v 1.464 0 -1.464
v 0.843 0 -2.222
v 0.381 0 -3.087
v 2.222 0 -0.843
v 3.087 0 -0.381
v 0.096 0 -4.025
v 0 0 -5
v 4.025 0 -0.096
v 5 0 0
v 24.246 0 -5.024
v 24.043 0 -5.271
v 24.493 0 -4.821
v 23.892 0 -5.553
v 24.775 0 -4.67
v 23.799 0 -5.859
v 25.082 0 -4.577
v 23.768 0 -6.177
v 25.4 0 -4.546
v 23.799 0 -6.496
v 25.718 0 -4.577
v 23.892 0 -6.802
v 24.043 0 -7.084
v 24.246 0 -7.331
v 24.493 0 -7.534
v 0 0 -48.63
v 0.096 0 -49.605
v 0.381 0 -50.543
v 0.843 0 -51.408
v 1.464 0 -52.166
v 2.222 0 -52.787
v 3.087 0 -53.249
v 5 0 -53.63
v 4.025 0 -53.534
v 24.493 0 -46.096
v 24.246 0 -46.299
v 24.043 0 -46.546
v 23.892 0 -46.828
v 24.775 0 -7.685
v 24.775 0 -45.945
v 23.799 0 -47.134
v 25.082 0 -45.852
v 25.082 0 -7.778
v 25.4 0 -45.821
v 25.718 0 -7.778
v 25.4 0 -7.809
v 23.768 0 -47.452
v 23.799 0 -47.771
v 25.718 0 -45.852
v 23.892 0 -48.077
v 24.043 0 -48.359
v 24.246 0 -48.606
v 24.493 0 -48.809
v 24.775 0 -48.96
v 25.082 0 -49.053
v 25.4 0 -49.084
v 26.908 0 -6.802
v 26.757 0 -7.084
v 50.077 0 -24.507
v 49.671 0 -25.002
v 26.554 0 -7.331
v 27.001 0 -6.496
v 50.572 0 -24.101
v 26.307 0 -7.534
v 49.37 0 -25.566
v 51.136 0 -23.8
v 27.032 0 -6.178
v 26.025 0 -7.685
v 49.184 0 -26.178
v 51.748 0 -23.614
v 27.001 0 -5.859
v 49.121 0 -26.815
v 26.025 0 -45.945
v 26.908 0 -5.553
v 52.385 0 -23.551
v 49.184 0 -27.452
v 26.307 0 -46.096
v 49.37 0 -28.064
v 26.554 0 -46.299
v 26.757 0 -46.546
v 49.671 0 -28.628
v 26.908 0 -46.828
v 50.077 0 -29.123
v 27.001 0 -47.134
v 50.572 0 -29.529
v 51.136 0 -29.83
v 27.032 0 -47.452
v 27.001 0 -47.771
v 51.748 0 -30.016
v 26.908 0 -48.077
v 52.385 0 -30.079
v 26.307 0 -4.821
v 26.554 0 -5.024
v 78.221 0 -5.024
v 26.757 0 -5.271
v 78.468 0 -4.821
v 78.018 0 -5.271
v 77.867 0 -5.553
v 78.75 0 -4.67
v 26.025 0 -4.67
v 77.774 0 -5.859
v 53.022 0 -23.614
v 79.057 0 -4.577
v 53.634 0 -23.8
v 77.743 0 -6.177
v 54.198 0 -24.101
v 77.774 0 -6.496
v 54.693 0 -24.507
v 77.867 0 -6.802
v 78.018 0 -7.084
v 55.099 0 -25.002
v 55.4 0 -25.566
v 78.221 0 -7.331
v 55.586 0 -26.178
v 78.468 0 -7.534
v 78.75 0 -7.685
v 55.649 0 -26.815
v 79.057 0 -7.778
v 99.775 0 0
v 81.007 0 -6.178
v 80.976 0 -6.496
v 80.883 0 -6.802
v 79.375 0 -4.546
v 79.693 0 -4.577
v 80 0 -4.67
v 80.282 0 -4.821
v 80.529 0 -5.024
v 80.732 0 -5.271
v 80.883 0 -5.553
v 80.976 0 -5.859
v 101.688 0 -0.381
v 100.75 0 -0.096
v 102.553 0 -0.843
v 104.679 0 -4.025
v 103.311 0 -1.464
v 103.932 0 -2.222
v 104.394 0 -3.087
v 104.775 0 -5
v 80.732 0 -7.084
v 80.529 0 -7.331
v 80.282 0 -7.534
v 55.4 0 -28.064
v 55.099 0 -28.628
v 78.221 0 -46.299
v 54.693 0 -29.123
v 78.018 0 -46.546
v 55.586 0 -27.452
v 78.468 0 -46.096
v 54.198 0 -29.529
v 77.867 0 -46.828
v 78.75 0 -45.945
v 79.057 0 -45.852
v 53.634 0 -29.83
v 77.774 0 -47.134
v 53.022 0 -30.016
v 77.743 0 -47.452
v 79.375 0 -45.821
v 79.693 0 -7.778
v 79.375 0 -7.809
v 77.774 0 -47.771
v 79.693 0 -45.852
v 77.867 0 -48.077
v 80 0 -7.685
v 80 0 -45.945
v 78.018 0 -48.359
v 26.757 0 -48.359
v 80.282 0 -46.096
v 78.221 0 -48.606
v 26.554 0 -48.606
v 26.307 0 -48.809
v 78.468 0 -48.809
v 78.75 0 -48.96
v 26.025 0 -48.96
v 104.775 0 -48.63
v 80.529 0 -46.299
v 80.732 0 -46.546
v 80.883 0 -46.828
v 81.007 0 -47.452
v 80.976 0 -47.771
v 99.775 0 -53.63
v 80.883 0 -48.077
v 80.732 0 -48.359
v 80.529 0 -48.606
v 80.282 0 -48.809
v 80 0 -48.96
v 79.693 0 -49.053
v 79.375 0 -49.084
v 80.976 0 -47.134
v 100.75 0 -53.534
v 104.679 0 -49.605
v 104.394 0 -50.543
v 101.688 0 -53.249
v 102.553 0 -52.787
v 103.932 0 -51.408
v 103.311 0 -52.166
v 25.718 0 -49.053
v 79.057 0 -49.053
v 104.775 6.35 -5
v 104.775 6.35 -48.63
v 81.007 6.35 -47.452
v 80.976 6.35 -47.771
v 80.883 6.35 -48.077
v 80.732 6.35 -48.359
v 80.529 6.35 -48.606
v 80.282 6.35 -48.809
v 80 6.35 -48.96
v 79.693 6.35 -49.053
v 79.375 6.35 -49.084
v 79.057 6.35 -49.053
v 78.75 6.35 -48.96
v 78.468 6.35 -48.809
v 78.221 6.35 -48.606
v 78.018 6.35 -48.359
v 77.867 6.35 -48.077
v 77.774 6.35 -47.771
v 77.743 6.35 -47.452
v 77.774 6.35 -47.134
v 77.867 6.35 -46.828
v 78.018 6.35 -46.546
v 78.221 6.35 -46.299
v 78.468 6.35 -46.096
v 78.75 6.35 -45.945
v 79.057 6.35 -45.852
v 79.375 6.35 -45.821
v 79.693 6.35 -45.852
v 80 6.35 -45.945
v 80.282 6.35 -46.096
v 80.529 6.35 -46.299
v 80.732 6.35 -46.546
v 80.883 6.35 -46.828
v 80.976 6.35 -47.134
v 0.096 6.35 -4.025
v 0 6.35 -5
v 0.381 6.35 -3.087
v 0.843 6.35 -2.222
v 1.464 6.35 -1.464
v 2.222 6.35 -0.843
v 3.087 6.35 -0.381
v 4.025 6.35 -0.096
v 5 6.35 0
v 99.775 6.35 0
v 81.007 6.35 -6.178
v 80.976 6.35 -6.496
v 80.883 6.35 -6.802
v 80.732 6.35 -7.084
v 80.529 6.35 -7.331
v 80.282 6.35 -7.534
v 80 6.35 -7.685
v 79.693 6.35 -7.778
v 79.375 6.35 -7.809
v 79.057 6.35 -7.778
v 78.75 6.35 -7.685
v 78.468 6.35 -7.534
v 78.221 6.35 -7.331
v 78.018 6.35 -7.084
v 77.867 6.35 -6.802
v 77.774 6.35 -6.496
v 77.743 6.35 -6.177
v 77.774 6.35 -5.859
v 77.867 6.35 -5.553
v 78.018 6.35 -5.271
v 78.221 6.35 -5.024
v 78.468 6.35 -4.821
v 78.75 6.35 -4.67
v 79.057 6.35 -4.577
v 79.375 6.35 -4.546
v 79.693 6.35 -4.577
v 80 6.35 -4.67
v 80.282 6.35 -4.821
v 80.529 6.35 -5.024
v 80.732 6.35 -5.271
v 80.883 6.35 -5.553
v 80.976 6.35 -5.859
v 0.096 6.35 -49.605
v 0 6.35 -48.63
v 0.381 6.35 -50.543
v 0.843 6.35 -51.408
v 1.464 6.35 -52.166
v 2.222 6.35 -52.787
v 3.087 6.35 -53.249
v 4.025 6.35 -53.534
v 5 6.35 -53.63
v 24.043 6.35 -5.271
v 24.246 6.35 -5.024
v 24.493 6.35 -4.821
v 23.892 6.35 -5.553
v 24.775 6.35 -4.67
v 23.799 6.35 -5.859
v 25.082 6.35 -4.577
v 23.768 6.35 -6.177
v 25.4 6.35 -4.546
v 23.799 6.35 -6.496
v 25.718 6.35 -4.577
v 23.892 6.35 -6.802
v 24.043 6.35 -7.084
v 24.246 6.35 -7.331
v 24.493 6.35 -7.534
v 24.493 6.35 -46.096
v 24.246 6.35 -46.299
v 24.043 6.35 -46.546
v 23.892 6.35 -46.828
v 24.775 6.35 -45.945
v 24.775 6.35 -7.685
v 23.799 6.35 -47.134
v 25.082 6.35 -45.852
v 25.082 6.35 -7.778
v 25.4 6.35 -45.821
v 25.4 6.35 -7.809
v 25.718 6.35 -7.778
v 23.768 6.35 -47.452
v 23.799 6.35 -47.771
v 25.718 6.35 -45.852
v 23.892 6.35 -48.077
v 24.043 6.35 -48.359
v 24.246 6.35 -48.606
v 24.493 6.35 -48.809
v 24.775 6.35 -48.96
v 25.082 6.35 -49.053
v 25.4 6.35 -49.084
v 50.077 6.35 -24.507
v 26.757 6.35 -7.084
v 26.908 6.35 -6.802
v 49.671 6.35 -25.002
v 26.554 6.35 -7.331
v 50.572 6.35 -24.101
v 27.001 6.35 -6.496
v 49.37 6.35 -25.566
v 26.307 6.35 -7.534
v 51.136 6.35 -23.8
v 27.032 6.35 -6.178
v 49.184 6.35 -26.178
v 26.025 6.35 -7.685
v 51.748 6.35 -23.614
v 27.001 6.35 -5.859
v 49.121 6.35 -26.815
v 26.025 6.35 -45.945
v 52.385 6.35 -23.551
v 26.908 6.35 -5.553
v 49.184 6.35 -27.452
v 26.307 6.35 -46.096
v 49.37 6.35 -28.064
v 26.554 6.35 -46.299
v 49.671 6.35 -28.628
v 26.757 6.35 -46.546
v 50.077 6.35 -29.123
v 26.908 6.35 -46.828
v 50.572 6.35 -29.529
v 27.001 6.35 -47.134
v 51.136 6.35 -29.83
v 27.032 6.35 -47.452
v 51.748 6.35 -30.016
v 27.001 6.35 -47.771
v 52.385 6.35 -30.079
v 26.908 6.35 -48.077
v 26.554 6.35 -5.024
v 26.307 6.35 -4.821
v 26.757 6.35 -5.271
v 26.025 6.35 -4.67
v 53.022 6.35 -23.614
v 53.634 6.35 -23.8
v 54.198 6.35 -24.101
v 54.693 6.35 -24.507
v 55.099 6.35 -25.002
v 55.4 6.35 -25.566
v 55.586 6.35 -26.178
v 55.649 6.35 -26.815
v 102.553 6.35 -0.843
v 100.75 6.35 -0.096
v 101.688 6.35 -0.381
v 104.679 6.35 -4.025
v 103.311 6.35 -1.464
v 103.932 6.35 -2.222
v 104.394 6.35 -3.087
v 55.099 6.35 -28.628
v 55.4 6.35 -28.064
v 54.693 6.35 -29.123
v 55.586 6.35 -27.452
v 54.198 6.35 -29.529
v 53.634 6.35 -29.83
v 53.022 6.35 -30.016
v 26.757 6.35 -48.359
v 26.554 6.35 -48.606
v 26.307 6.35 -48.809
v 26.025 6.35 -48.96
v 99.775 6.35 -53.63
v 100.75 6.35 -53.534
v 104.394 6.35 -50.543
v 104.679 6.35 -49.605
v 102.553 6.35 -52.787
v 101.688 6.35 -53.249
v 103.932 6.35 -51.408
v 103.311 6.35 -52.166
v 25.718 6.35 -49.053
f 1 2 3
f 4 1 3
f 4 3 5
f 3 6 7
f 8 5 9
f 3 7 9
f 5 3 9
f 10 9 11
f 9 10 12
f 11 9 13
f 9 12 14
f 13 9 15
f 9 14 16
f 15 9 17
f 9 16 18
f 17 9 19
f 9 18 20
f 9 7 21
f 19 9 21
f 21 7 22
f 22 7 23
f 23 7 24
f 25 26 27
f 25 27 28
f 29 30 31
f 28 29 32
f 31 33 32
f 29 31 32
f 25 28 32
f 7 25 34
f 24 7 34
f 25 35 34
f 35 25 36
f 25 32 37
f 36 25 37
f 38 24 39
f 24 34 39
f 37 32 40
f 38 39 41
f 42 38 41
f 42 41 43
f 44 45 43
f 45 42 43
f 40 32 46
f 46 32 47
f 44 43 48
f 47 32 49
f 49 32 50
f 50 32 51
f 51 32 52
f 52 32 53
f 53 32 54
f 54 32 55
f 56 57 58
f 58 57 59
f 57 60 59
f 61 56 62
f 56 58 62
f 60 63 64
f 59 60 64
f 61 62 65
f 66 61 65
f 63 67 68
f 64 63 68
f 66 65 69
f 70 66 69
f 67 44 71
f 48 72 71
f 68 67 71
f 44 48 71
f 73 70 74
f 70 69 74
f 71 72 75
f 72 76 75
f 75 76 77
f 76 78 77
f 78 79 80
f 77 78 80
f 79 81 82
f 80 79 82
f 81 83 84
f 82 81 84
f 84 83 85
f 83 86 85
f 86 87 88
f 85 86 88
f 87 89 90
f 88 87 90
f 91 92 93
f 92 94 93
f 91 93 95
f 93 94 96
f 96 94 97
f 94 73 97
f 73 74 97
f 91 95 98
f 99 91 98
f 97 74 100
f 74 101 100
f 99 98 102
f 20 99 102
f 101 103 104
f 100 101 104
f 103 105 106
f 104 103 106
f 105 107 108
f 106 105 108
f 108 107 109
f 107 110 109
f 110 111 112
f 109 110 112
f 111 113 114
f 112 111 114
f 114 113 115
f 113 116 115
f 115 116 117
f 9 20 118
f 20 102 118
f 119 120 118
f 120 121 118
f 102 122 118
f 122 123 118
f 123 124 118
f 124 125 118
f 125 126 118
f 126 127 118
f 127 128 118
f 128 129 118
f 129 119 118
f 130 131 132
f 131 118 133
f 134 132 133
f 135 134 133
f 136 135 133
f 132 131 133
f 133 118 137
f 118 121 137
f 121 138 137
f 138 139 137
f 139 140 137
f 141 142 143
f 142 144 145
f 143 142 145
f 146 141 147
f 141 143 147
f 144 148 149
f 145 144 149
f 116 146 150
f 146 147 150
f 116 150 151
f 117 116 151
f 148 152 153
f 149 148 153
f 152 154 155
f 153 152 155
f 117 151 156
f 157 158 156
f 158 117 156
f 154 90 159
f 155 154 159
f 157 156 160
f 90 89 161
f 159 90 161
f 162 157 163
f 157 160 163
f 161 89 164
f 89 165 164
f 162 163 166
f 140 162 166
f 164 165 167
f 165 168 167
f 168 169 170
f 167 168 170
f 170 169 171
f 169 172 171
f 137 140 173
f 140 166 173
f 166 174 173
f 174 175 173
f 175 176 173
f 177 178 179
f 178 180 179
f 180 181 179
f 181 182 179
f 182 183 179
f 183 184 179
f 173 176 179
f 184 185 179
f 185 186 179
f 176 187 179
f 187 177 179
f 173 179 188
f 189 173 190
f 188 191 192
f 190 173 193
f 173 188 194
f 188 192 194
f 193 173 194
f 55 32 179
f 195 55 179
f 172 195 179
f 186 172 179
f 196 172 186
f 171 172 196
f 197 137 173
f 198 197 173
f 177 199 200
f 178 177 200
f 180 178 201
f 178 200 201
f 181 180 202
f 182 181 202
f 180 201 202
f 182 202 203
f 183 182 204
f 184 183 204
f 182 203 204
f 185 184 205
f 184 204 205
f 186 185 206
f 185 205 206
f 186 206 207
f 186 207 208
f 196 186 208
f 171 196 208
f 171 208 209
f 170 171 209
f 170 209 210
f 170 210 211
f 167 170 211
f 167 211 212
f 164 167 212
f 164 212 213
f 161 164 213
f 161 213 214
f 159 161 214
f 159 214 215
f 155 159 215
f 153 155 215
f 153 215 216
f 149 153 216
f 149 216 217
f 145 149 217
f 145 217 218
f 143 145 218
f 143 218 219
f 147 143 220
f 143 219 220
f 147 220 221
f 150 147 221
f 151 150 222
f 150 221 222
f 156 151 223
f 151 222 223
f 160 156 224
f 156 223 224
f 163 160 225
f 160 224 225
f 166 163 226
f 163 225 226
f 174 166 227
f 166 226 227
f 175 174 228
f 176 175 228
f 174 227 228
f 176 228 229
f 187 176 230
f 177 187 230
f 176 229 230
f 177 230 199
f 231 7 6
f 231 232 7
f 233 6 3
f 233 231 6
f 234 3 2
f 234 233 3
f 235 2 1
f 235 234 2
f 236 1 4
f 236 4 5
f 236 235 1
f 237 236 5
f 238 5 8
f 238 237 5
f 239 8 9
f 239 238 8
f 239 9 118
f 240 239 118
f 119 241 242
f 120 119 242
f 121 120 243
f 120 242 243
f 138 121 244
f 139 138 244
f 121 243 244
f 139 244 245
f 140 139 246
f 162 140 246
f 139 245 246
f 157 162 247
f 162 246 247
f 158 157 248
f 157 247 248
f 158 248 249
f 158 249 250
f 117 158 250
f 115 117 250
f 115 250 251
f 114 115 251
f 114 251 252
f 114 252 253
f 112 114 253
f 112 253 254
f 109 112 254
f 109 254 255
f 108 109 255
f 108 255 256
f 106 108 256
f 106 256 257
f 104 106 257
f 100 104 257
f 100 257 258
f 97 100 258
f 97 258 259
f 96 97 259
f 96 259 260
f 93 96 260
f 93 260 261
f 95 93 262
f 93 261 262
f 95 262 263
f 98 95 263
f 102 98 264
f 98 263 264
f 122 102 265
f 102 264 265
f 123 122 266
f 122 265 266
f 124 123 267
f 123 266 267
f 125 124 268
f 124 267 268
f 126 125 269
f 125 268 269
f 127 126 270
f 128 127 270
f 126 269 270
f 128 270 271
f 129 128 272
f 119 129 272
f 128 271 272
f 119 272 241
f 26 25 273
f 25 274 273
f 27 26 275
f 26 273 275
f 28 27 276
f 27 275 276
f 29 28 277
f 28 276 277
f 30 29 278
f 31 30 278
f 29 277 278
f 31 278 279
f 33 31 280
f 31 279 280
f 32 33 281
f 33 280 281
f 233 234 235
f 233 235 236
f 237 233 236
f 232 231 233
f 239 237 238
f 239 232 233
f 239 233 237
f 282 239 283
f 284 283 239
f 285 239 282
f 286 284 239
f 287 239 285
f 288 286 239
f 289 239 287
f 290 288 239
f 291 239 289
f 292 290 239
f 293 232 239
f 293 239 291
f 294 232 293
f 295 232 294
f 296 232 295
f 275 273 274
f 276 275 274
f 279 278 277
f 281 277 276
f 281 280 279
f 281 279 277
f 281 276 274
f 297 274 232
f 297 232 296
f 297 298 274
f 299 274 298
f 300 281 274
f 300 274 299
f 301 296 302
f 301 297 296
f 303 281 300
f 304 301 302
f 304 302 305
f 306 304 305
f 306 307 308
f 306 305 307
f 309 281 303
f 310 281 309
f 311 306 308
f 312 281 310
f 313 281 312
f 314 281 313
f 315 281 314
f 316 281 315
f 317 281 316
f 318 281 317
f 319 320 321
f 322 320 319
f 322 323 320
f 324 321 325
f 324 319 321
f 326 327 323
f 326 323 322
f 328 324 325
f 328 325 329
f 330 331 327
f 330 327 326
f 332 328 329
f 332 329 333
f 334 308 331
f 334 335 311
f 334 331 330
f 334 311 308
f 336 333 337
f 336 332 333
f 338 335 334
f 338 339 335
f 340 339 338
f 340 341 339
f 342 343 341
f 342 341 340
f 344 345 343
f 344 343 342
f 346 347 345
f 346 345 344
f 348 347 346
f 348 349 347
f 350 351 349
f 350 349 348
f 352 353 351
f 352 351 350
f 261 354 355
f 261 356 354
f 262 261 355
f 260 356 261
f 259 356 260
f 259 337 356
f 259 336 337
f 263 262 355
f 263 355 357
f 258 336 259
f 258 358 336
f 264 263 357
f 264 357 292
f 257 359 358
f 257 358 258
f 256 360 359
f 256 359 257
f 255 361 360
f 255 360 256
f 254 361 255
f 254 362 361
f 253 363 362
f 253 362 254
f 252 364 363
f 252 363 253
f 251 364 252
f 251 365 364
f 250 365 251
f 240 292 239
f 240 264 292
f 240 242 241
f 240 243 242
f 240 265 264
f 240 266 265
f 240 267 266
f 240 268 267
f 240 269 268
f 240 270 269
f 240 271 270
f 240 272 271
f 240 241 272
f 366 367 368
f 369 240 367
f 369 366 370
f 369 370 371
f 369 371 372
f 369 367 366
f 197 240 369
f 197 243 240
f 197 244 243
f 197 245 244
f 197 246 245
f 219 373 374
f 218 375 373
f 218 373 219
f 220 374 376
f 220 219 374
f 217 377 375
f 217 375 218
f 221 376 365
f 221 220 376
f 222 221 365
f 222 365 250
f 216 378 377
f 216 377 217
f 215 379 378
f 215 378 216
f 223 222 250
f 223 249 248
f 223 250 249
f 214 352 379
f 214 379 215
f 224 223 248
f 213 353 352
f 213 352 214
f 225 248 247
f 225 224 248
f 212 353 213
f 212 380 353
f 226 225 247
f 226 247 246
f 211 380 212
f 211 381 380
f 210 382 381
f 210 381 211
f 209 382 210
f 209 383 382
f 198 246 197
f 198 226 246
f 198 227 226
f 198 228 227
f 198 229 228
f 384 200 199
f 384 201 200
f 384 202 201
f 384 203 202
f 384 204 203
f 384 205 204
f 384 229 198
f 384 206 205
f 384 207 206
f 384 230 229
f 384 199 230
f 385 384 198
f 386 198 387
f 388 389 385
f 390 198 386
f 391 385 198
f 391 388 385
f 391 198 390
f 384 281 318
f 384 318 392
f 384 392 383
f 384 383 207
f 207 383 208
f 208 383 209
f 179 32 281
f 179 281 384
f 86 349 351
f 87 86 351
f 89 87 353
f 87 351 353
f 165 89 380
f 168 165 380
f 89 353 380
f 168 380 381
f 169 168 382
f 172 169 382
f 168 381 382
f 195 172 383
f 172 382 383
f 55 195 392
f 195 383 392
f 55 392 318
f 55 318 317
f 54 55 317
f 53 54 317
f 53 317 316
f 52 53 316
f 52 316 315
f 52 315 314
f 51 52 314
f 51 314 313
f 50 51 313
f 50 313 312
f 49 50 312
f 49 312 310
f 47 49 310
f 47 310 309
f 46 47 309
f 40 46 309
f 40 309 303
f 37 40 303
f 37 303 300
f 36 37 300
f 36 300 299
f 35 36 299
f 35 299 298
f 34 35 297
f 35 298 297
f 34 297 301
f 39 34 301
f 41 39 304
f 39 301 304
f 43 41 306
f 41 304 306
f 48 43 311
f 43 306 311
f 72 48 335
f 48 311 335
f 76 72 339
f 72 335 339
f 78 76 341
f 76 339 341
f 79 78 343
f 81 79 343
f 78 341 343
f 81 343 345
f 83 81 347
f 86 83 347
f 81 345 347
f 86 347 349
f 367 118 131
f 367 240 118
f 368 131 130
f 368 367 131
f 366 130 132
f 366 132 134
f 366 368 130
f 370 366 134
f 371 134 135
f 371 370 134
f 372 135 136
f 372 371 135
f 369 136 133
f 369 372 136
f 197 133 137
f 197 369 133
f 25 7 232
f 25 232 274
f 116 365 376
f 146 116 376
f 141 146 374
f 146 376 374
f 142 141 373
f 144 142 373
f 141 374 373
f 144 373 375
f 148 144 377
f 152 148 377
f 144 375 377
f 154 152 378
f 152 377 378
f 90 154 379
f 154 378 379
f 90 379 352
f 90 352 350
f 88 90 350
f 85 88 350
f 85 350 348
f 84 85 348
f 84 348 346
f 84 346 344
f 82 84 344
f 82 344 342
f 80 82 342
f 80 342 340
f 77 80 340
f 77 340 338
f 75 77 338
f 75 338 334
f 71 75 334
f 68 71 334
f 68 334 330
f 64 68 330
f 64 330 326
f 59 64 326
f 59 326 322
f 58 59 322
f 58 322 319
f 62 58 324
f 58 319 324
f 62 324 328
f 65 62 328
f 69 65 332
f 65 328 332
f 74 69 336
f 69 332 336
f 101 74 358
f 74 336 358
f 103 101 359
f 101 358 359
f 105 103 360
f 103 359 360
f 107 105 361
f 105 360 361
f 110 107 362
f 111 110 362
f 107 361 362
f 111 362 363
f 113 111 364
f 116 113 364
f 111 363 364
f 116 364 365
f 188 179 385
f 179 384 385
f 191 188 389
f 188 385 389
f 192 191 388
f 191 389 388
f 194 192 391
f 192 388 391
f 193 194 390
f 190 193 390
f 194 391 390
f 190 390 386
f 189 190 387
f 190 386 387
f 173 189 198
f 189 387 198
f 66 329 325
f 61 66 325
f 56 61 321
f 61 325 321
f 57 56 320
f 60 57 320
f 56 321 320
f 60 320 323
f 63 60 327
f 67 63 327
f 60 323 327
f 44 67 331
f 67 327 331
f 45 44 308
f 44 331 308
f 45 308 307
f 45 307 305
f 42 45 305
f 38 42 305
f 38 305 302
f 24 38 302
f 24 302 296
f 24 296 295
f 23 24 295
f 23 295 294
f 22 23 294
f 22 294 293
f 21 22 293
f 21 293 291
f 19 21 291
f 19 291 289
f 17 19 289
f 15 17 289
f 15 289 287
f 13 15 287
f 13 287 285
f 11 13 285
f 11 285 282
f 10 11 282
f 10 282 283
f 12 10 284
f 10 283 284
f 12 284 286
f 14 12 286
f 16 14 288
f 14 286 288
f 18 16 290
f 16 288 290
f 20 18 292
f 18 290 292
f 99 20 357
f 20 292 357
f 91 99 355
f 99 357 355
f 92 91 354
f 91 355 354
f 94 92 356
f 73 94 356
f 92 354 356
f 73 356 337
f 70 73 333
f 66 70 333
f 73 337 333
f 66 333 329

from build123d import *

# Parameters (mm, degrees)
SKETCH1_W                    = 104.775
SKETCH1_H                    = 53.63
BOSS_EXTRUDE1_DEPTH          = 6.35
F_0_257_DIAMETER_HOLE1_D     = 6.5278
FILLET1_R                    = 5
F_30_0_1285_DIAMETER_HOLE1_D = 3.2639


with BuildPart() as part:
    # Sketch1 → Boss-Extrude1 (new body)
    with BuildSketch(Plane(origin=(0, 0, 0), x_dir=(1, 0, 0), z_dir=(0, 1, 0))):
        with Locations((52.3875, 26.815)):
            Rectangle(SKETCH1_W, SKETCH1_H)
    extrude(amount=BOSS_EXTRUDE1_DEPTH)

    # F (0.257) Diameter Hole1 (through all)
    with Locations(Plane(origin=(0, 0, 0), x_dir=(-1, 0, 0), z_dir=(0, -1, 0))):
        with Locations((-52.385, 26.815)):
            Hole(F_0_257_DIAMETER_HOLE1_D / 2)

    # Fillet1
    fillet1_edges = [part.edges().sort_by_distance(p)[0] for p in [
        (0, 3.175, -53.63),
        (104.775, 3.175, -53.63),
        (104.775, 3.175, 0),
        (0, 3.175, 0),
    ]]
    fillet(fillet1_edges, radius=FILLET1_R)

    # #30 (0.1285) Diameter Hole1 (through all)
    with Locations(Plane(origin=(0, 0, 0), x_dir=(-1, 0, 0), z_dir=(0, -1, 0))):
        with Locations((-25.4, 6.1775), (-25.4, 47.4525), (-79.375, 47.4525), (-79.375, 6.1775)):
            Hole(F_30_0_1285_DIAMETER_HOLE1_D / 2)


solid = part.part
